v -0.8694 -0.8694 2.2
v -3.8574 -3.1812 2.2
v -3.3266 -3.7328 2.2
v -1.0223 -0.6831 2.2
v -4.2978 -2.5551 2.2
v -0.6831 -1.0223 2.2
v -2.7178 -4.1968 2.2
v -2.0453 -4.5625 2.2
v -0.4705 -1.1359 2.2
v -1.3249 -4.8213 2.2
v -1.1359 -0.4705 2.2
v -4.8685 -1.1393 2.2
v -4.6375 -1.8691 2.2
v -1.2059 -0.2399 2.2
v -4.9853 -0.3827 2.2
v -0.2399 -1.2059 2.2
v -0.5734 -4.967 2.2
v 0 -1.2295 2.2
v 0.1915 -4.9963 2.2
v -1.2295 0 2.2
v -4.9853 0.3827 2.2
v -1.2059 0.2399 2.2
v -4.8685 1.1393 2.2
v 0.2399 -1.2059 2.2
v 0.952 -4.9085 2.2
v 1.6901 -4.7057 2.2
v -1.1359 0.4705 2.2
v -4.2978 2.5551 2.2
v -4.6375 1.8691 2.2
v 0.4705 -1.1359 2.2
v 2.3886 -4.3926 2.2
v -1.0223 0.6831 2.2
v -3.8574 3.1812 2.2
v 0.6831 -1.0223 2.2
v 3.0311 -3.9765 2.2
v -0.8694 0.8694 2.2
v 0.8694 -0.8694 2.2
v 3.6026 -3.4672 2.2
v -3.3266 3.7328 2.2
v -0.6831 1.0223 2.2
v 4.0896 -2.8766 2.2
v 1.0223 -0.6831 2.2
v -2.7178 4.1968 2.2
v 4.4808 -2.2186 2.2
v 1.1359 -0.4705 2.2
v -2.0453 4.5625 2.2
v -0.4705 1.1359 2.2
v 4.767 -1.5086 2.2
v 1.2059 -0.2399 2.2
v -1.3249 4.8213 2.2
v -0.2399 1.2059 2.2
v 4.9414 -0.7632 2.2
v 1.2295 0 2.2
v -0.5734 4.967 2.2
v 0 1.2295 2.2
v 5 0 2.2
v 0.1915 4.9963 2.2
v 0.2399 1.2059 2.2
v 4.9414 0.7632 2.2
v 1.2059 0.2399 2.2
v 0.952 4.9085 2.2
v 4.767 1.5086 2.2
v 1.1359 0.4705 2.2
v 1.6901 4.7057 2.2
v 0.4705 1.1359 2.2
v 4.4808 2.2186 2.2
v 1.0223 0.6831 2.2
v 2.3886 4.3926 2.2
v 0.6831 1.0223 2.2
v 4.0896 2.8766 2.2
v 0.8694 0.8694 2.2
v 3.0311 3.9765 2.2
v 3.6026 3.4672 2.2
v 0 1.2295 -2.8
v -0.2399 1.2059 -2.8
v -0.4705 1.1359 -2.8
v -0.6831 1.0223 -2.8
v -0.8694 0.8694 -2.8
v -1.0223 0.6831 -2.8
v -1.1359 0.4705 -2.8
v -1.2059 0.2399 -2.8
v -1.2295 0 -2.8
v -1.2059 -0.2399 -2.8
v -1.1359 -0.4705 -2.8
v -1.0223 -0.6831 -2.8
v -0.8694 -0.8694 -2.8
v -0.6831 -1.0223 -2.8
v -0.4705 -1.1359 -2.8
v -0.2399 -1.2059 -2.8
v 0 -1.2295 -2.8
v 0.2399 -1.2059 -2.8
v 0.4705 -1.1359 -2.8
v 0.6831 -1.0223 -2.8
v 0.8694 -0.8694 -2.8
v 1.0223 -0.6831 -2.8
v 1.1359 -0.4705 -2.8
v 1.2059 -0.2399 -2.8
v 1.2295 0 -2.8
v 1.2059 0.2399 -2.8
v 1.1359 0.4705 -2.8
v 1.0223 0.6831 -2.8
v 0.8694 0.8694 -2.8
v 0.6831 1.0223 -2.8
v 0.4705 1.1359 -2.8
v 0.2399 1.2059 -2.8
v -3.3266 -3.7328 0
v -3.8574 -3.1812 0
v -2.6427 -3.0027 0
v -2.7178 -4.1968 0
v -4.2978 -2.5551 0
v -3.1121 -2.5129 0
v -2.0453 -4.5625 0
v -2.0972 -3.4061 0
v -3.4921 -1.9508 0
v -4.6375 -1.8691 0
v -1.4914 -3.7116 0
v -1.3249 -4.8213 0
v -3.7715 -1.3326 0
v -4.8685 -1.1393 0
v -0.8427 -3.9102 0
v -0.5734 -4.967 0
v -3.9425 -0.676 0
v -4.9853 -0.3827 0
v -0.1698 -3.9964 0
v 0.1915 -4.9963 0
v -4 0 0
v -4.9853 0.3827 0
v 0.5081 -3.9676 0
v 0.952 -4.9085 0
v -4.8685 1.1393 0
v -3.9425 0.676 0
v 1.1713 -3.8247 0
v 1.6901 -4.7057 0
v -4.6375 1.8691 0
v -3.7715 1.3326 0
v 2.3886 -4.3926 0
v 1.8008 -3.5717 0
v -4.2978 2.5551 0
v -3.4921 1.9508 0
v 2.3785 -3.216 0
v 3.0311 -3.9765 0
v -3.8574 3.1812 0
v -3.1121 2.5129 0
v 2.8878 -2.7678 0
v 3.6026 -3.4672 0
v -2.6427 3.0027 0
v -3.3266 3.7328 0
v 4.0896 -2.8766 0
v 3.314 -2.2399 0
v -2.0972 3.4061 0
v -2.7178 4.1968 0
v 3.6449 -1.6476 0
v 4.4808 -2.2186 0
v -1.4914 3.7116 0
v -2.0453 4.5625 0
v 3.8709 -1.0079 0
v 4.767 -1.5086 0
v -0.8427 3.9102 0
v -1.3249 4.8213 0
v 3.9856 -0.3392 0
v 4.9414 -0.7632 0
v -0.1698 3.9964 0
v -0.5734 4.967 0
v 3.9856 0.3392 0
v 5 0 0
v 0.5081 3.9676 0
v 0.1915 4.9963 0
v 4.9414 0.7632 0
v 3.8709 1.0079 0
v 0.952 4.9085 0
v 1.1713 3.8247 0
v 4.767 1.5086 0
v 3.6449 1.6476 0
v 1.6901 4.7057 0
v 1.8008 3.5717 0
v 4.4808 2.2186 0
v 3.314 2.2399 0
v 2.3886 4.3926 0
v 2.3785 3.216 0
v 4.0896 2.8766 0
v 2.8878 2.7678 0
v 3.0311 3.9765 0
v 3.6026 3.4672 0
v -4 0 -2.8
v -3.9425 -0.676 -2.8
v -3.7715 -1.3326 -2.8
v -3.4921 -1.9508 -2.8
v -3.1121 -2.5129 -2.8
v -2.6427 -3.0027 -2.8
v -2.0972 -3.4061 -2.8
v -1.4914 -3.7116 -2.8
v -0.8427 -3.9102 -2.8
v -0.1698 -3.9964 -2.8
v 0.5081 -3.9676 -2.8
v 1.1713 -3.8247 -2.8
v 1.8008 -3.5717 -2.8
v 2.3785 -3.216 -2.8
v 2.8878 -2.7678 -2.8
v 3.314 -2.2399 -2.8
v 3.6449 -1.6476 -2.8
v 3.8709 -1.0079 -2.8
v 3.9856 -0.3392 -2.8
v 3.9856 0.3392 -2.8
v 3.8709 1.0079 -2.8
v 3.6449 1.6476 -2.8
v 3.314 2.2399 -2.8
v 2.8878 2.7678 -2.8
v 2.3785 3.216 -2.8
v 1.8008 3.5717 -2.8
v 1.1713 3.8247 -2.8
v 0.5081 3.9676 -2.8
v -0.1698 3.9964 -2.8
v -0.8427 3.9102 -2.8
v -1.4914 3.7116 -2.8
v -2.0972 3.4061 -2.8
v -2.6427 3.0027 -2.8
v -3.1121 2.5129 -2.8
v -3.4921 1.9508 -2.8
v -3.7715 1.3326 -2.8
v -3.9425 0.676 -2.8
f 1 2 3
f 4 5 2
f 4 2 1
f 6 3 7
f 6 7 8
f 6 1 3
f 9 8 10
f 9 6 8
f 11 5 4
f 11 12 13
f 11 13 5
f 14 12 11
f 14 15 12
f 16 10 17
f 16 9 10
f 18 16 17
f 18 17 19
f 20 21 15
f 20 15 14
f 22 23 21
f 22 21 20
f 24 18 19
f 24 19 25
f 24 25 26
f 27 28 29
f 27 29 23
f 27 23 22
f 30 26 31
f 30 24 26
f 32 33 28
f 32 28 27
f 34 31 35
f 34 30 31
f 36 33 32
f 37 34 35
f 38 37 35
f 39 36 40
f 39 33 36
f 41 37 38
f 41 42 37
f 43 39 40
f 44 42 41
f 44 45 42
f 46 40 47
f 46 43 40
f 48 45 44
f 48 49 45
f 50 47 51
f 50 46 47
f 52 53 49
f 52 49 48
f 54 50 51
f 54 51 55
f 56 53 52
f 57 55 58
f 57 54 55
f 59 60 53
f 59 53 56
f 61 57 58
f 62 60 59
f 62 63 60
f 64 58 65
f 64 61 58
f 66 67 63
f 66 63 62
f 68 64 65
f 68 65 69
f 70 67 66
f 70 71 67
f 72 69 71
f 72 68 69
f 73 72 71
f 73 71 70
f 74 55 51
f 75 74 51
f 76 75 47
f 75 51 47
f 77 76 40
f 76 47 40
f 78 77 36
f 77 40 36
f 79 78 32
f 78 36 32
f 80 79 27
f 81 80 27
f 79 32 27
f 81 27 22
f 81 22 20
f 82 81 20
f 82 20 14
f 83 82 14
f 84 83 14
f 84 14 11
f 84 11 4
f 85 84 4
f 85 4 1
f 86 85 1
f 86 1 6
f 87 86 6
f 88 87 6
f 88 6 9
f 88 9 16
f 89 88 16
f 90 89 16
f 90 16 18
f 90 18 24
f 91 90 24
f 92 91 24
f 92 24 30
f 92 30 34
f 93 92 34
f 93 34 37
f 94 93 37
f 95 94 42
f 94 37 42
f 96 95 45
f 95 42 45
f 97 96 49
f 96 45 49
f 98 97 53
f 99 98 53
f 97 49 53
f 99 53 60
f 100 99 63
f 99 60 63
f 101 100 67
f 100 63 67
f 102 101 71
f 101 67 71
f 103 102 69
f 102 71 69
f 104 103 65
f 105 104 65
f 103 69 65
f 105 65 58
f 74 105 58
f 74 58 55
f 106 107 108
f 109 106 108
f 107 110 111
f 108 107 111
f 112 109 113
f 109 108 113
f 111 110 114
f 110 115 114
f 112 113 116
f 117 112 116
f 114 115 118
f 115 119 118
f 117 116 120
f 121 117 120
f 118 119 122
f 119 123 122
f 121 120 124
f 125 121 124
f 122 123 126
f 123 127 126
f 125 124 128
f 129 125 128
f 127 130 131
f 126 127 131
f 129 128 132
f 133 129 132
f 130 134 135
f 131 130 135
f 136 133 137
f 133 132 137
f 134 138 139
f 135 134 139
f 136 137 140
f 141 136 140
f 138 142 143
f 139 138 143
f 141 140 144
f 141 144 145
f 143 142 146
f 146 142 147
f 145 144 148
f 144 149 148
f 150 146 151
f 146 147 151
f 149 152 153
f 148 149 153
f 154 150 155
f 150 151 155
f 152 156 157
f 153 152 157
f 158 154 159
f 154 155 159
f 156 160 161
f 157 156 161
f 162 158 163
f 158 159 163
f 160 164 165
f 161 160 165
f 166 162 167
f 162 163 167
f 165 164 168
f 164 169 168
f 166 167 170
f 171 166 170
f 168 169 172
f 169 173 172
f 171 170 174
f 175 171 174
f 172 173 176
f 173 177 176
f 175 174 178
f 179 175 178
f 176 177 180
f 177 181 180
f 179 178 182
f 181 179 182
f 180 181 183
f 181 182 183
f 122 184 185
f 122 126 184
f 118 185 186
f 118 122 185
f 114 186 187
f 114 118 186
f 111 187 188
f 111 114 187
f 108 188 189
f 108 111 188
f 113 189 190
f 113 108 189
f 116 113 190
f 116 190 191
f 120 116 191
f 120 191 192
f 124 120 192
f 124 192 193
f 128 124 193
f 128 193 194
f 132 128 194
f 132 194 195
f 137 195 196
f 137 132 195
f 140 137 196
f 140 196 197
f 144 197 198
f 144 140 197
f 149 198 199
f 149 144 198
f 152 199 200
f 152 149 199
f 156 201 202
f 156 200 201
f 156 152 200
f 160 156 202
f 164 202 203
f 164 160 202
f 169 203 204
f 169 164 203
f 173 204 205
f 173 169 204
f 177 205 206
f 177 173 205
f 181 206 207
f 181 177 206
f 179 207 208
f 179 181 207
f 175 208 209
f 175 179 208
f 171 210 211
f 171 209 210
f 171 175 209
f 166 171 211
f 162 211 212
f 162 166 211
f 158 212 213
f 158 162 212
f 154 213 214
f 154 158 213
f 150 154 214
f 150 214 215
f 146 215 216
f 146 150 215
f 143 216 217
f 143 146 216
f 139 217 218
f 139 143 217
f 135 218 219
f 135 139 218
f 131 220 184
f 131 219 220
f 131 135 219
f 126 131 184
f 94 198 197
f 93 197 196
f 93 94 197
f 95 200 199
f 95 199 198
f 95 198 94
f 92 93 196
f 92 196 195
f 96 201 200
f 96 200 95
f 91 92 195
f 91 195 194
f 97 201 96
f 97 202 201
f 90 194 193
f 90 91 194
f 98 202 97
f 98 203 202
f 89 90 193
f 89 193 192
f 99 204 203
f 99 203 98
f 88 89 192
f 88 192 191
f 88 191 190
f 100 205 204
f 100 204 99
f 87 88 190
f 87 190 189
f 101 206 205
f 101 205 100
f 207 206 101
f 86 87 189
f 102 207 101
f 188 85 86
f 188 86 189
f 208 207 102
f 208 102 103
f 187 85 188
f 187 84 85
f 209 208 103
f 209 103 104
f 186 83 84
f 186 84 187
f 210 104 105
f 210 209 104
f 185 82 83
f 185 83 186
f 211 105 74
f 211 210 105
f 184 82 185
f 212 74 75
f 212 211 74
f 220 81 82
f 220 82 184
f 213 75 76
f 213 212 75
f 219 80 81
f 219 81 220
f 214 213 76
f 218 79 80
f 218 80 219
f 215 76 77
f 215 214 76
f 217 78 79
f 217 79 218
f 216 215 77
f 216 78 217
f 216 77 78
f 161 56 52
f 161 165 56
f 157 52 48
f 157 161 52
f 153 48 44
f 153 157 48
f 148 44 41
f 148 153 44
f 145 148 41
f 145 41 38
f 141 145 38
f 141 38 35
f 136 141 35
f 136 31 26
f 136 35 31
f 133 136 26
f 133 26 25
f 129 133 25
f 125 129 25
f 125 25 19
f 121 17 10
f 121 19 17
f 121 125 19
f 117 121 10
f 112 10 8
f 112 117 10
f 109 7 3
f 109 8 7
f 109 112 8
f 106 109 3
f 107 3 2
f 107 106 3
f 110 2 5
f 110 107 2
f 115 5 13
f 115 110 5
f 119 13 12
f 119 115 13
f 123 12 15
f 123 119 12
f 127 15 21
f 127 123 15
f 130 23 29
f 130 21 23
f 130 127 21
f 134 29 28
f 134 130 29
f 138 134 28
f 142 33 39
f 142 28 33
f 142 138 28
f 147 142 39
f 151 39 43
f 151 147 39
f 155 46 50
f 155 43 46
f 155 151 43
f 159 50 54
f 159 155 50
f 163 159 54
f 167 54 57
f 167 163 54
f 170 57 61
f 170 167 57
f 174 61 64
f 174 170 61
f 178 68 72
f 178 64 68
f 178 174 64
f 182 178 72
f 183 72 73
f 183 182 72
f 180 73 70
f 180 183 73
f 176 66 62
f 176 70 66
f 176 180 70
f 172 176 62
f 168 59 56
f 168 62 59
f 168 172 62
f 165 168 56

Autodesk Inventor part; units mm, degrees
ref_plane "YZ Plane" through (0, 0, 0) normal (1, 0, 0) x (0, 1, 0)
ref_plane "XZ Plane" through (0, 0, 0) normal (0, 1, 0) x (-1, 0, 0)
ref_plane "XY Plane" through (0, 0, 0) normal (0, 0, 1) x (1, 0, 0)
sketch "スケッチ1" plane through (0, 0, 0) normal (0, 0, 1) x (1, 0, 0)
  circle A0 centre (0, 0) radius 5
  dimension "d0" = 10
extrude "押し出し1" add sketch "スケッチ1" along normal blind 2.2
sketch "スケッチ2" plane through (0, 0, 0) normal (0, 0, -1) x (-1, 0, 0)
  circle A0 centre (0, 0) radius 4
  dimension "d3" = 8
extrude "押し出し2" add sketch "スケッチ2" along normal blind 2.8
sketch "スケッチ3" plane through (0, 0, -2.8) normal (0, 0, -1) x (-1, 0, 0)
  point P0 (0, 0)
  point P1 (0, 0)
hole "穴1" at (0, 0, -2.8) direction (0, 0, 1) diameter 2.459 end through all thread size "M3x0.5" class "6H" standard "ISO Metric profile"
properties part number "link2part7" material "アルミニウム 6061"
